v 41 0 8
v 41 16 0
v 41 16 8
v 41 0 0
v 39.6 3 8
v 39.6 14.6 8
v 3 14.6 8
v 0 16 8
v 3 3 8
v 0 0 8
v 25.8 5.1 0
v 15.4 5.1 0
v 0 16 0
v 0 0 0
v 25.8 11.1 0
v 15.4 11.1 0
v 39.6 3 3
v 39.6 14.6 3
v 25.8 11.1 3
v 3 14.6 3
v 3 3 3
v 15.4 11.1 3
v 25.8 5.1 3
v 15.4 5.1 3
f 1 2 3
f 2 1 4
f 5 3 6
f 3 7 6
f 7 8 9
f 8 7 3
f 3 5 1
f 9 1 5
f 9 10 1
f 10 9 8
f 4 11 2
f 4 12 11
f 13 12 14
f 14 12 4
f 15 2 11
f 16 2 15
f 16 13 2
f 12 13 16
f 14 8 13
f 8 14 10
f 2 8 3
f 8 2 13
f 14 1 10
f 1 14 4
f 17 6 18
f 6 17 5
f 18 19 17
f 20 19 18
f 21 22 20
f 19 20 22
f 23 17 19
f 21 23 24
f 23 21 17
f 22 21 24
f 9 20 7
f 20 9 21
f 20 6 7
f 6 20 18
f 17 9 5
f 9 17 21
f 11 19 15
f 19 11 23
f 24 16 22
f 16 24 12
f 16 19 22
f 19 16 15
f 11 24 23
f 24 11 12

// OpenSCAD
// Cliff Sensor Mounting Pocket Jig
// Verifies TCRT5000 cliff sensor module fits in its chassis slot.

// Sensor parameters (matches cliff-sensor.scad)
sensor_module_l = 35;  // mm (estimate)
sensor_module_w = 10;  // mm (estimate)
sensor_body_h   =  7;  // mm (datasheet TCRT5000)

mount_thick    =  3;   // mm
clearance      =  0.8; // mm
pocket_depth   =  5;   // mm — how deep the sensor recesses

$fn = 16;

module jig() {
    difference() {
        cube([sensor_module_l + 2*mount_thick,
              sensor_module_w + 2*mount_thick,
              mount_thick + pocket_depth]);
        // Pocket
        translate([mount_thick, mount_thick, mount_thick])
            cube([sensor_module_l + 2*clearance,
                  sensor_module_w + 2*clearance,
                  pocket_depth + 0.1]);
        // Hole for sensor body to protrude
        translate([mount_thick + (sensor_module_l - 10.2)/2,
                   mount_thick + (sensor_module_w - 5.8)/2,
                   -0.1])
            cube([10.4, 6.0, mount_thick + 0.3]);
    }
}

jig();
